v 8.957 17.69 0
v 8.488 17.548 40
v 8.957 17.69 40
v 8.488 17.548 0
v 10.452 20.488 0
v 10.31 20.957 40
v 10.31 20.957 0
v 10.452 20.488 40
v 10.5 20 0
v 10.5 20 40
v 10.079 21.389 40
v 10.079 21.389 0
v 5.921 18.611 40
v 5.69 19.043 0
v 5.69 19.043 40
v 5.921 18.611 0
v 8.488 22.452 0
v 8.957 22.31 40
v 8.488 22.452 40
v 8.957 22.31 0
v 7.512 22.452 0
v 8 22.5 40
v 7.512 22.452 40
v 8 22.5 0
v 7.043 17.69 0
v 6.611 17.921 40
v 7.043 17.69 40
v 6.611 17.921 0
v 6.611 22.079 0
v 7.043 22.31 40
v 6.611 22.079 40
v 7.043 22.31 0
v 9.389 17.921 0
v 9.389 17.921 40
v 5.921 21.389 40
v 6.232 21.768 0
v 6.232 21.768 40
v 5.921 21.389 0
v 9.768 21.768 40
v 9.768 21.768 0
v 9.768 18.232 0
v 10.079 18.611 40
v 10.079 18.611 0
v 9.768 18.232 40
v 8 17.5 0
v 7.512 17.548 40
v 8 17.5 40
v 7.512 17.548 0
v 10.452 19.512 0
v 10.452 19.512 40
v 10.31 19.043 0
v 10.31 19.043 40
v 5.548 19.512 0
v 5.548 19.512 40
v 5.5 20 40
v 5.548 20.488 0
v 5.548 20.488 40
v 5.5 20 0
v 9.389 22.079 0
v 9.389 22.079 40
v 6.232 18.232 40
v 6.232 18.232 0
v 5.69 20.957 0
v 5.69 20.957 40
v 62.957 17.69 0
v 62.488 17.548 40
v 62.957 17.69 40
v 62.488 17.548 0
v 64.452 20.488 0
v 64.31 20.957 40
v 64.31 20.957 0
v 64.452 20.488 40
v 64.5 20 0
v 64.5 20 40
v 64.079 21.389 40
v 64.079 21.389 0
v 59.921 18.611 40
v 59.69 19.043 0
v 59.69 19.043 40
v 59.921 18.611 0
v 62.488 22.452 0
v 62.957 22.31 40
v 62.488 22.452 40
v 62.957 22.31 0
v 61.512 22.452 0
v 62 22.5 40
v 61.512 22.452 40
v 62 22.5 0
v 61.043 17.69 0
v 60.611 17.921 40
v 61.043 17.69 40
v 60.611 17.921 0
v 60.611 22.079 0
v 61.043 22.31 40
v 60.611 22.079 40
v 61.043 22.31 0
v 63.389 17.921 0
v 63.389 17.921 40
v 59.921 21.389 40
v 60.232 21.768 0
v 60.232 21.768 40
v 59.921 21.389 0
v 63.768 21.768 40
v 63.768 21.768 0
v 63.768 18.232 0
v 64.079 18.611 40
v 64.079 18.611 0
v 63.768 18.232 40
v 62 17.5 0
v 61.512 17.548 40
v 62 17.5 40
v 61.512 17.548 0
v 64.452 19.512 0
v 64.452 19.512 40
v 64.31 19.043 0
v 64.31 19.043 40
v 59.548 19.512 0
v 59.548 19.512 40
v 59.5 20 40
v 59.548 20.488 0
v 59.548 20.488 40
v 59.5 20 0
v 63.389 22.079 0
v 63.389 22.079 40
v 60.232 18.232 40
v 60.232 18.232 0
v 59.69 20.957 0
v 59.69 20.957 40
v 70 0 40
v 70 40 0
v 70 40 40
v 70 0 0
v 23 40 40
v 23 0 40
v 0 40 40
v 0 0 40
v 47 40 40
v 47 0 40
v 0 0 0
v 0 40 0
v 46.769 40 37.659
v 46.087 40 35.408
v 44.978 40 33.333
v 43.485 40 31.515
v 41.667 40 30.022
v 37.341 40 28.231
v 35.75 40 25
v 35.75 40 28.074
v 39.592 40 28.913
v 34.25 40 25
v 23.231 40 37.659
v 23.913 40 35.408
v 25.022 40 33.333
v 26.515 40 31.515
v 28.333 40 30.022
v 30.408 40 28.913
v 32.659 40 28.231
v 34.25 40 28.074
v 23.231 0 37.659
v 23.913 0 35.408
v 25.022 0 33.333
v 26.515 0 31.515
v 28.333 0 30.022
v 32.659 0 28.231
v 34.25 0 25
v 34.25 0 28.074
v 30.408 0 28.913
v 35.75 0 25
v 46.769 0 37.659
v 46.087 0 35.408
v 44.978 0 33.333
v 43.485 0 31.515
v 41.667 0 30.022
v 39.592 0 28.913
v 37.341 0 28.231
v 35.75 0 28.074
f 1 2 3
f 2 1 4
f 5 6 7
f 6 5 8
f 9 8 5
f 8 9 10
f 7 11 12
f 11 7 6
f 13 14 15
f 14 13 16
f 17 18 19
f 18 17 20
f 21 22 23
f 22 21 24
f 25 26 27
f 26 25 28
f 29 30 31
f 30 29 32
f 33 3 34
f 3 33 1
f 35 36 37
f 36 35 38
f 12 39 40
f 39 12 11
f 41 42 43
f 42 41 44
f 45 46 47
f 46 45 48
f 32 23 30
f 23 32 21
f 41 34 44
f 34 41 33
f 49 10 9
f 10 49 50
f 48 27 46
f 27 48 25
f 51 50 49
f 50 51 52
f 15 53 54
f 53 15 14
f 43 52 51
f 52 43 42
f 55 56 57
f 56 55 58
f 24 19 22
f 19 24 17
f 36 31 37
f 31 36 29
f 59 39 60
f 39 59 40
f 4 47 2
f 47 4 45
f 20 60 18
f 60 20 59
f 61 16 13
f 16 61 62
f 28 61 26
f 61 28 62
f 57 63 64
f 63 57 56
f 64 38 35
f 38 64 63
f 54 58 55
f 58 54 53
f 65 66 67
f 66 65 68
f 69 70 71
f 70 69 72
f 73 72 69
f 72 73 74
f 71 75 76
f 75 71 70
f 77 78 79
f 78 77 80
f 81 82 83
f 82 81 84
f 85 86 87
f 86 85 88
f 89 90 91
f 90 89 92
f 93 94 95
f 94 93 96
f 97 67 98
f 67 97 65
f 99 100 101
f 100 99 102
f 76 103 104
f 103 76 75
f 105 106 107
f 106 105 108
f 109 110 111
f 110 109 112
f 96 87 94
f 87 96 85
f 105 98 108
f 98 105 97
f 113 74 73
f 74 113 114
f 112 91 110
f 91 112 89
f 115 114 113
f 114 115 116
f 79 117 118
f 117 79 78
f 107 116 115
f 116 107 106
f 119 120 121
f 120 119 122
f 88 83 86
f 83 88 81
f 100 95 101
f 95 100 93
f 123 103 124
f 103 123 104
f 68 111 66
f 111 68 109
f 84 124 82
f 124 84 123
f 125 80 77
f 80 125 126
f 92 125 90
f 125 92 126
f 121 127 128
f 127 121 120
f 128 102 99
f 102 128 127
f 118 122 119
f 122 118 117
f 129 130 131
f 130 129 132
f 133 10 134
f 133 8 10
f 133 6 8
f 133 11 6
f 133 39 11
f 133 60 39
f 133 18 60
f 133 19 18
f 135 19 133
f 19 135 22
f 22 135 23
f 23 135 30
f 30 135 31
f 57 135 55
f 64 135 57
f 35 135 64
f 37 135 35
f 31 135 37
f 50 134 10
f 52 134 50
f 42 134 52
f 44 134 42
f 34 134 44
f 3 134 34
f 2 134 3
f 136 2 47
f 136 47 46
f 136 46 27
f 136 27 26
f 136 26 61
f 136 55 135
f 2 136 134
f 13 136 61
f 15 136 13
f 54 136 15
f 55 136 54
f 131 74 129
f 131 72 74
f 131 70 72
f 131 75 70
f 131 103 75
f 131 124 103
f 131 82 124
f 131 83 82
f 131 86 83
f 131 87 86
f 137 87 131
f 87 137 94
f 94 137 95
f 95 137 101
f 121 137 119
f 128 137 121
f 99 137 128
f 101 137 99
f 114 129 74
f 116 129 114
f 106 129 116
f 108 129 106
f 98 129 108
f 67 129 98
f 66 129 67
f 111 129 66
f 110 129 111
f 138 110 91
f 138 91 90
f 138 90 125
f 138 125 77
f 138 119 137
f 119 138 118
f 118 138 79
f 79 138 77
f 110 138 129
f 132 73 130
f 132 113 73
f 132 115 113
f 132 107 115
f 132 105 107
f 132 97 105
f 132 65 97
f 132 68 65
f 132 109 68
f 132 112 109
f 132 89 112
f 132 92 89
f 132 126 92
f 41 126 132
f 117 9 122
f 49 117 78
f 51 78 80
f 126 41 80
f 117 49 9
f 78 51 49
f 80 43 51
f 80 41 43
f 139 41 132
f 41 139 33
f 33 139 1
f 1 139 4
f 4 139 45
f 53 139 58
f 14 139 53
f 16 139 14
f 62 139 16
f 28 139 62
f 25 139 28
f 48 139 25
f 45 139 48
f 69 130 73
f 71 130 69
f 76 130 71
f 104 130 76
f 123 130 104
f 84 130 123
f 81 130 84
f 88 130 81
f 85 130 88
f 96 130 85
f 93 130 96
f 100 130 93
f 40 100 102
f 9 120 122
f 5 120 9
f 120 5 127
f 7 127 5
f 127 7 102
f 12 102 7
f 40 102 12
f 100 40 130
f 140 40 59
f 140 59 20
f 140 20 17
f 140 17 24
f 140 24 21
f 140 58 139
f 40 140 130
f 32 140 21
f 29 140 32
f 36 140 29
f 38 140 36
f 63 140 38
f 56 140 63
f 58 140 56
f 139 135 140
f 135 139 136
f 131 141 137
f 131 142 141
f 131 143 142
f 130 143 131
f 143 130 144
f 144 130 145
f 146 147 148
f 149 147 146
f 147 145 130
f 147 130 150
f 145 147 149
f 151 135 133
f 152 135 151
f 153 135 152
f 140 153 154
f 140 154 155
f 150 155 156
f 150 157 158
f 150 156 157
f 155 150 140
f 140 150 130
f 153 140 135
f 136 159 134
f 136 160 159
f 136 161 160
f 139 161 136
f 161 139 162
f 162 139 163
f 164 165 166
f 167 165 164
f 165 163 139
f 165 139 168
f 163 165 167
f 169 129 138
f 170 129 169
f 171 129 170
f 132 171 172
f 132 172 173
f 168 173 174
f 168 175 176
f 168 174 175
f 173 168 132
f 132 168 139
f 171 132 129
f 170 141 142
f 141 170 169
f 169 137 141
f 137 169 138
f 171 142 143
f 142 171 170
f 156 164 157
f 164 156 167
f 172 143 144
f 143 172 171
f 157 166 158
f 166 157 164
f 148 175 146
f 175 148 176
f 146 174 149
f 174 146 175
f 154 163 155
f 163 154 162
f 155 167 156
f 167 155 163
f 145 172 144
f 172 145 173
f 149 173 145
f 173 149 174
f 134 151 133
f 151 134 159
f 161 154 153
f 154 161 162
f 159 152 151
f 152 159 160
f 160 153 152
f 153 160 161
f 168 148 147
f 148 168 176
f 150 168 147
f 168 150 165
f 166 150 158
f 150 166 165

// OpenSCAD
$fn = 32;

// ----------------------------------------------------------------------
// Saddle clamp: split shaft clamp
// ----------------------------------------------------------------------

// --- parameters (mm) ---
blk_l = 70;               // block length, X
blk_w = 40;               // block width, Y
blk_h = 40;               // block height
clamp_r = 12;             // shaft groove radius
hole_r = 2.5;             // bolt hole radius
hole_m = 8;               // bolt hole margin from the ends
saw_w = 1.5;              // saw kerf width

saw_depth = clamp_r + 3;  // saw kerf depth

difference() {
  cube([blk_l, blk_w, blk_h]);
  translate([blk_l / 2, -1, blk_h])
    rotate([-90, 0, 0])
      cylinder(h = blk_w + 2, r = clamp_r);
  for (sx = [0, 1])
    translate([sx ? blk_l - hole_m : hole_m, blk_w / 2, -1])
      cylinder(r = hole_r, h = blk_h + 2);
  translate([blk_l / 2 - saw_w / 2, -1, blk_h - saw_depth])
    cube([saw_w, blk_w + 2, saw_depth + 1]);
}
